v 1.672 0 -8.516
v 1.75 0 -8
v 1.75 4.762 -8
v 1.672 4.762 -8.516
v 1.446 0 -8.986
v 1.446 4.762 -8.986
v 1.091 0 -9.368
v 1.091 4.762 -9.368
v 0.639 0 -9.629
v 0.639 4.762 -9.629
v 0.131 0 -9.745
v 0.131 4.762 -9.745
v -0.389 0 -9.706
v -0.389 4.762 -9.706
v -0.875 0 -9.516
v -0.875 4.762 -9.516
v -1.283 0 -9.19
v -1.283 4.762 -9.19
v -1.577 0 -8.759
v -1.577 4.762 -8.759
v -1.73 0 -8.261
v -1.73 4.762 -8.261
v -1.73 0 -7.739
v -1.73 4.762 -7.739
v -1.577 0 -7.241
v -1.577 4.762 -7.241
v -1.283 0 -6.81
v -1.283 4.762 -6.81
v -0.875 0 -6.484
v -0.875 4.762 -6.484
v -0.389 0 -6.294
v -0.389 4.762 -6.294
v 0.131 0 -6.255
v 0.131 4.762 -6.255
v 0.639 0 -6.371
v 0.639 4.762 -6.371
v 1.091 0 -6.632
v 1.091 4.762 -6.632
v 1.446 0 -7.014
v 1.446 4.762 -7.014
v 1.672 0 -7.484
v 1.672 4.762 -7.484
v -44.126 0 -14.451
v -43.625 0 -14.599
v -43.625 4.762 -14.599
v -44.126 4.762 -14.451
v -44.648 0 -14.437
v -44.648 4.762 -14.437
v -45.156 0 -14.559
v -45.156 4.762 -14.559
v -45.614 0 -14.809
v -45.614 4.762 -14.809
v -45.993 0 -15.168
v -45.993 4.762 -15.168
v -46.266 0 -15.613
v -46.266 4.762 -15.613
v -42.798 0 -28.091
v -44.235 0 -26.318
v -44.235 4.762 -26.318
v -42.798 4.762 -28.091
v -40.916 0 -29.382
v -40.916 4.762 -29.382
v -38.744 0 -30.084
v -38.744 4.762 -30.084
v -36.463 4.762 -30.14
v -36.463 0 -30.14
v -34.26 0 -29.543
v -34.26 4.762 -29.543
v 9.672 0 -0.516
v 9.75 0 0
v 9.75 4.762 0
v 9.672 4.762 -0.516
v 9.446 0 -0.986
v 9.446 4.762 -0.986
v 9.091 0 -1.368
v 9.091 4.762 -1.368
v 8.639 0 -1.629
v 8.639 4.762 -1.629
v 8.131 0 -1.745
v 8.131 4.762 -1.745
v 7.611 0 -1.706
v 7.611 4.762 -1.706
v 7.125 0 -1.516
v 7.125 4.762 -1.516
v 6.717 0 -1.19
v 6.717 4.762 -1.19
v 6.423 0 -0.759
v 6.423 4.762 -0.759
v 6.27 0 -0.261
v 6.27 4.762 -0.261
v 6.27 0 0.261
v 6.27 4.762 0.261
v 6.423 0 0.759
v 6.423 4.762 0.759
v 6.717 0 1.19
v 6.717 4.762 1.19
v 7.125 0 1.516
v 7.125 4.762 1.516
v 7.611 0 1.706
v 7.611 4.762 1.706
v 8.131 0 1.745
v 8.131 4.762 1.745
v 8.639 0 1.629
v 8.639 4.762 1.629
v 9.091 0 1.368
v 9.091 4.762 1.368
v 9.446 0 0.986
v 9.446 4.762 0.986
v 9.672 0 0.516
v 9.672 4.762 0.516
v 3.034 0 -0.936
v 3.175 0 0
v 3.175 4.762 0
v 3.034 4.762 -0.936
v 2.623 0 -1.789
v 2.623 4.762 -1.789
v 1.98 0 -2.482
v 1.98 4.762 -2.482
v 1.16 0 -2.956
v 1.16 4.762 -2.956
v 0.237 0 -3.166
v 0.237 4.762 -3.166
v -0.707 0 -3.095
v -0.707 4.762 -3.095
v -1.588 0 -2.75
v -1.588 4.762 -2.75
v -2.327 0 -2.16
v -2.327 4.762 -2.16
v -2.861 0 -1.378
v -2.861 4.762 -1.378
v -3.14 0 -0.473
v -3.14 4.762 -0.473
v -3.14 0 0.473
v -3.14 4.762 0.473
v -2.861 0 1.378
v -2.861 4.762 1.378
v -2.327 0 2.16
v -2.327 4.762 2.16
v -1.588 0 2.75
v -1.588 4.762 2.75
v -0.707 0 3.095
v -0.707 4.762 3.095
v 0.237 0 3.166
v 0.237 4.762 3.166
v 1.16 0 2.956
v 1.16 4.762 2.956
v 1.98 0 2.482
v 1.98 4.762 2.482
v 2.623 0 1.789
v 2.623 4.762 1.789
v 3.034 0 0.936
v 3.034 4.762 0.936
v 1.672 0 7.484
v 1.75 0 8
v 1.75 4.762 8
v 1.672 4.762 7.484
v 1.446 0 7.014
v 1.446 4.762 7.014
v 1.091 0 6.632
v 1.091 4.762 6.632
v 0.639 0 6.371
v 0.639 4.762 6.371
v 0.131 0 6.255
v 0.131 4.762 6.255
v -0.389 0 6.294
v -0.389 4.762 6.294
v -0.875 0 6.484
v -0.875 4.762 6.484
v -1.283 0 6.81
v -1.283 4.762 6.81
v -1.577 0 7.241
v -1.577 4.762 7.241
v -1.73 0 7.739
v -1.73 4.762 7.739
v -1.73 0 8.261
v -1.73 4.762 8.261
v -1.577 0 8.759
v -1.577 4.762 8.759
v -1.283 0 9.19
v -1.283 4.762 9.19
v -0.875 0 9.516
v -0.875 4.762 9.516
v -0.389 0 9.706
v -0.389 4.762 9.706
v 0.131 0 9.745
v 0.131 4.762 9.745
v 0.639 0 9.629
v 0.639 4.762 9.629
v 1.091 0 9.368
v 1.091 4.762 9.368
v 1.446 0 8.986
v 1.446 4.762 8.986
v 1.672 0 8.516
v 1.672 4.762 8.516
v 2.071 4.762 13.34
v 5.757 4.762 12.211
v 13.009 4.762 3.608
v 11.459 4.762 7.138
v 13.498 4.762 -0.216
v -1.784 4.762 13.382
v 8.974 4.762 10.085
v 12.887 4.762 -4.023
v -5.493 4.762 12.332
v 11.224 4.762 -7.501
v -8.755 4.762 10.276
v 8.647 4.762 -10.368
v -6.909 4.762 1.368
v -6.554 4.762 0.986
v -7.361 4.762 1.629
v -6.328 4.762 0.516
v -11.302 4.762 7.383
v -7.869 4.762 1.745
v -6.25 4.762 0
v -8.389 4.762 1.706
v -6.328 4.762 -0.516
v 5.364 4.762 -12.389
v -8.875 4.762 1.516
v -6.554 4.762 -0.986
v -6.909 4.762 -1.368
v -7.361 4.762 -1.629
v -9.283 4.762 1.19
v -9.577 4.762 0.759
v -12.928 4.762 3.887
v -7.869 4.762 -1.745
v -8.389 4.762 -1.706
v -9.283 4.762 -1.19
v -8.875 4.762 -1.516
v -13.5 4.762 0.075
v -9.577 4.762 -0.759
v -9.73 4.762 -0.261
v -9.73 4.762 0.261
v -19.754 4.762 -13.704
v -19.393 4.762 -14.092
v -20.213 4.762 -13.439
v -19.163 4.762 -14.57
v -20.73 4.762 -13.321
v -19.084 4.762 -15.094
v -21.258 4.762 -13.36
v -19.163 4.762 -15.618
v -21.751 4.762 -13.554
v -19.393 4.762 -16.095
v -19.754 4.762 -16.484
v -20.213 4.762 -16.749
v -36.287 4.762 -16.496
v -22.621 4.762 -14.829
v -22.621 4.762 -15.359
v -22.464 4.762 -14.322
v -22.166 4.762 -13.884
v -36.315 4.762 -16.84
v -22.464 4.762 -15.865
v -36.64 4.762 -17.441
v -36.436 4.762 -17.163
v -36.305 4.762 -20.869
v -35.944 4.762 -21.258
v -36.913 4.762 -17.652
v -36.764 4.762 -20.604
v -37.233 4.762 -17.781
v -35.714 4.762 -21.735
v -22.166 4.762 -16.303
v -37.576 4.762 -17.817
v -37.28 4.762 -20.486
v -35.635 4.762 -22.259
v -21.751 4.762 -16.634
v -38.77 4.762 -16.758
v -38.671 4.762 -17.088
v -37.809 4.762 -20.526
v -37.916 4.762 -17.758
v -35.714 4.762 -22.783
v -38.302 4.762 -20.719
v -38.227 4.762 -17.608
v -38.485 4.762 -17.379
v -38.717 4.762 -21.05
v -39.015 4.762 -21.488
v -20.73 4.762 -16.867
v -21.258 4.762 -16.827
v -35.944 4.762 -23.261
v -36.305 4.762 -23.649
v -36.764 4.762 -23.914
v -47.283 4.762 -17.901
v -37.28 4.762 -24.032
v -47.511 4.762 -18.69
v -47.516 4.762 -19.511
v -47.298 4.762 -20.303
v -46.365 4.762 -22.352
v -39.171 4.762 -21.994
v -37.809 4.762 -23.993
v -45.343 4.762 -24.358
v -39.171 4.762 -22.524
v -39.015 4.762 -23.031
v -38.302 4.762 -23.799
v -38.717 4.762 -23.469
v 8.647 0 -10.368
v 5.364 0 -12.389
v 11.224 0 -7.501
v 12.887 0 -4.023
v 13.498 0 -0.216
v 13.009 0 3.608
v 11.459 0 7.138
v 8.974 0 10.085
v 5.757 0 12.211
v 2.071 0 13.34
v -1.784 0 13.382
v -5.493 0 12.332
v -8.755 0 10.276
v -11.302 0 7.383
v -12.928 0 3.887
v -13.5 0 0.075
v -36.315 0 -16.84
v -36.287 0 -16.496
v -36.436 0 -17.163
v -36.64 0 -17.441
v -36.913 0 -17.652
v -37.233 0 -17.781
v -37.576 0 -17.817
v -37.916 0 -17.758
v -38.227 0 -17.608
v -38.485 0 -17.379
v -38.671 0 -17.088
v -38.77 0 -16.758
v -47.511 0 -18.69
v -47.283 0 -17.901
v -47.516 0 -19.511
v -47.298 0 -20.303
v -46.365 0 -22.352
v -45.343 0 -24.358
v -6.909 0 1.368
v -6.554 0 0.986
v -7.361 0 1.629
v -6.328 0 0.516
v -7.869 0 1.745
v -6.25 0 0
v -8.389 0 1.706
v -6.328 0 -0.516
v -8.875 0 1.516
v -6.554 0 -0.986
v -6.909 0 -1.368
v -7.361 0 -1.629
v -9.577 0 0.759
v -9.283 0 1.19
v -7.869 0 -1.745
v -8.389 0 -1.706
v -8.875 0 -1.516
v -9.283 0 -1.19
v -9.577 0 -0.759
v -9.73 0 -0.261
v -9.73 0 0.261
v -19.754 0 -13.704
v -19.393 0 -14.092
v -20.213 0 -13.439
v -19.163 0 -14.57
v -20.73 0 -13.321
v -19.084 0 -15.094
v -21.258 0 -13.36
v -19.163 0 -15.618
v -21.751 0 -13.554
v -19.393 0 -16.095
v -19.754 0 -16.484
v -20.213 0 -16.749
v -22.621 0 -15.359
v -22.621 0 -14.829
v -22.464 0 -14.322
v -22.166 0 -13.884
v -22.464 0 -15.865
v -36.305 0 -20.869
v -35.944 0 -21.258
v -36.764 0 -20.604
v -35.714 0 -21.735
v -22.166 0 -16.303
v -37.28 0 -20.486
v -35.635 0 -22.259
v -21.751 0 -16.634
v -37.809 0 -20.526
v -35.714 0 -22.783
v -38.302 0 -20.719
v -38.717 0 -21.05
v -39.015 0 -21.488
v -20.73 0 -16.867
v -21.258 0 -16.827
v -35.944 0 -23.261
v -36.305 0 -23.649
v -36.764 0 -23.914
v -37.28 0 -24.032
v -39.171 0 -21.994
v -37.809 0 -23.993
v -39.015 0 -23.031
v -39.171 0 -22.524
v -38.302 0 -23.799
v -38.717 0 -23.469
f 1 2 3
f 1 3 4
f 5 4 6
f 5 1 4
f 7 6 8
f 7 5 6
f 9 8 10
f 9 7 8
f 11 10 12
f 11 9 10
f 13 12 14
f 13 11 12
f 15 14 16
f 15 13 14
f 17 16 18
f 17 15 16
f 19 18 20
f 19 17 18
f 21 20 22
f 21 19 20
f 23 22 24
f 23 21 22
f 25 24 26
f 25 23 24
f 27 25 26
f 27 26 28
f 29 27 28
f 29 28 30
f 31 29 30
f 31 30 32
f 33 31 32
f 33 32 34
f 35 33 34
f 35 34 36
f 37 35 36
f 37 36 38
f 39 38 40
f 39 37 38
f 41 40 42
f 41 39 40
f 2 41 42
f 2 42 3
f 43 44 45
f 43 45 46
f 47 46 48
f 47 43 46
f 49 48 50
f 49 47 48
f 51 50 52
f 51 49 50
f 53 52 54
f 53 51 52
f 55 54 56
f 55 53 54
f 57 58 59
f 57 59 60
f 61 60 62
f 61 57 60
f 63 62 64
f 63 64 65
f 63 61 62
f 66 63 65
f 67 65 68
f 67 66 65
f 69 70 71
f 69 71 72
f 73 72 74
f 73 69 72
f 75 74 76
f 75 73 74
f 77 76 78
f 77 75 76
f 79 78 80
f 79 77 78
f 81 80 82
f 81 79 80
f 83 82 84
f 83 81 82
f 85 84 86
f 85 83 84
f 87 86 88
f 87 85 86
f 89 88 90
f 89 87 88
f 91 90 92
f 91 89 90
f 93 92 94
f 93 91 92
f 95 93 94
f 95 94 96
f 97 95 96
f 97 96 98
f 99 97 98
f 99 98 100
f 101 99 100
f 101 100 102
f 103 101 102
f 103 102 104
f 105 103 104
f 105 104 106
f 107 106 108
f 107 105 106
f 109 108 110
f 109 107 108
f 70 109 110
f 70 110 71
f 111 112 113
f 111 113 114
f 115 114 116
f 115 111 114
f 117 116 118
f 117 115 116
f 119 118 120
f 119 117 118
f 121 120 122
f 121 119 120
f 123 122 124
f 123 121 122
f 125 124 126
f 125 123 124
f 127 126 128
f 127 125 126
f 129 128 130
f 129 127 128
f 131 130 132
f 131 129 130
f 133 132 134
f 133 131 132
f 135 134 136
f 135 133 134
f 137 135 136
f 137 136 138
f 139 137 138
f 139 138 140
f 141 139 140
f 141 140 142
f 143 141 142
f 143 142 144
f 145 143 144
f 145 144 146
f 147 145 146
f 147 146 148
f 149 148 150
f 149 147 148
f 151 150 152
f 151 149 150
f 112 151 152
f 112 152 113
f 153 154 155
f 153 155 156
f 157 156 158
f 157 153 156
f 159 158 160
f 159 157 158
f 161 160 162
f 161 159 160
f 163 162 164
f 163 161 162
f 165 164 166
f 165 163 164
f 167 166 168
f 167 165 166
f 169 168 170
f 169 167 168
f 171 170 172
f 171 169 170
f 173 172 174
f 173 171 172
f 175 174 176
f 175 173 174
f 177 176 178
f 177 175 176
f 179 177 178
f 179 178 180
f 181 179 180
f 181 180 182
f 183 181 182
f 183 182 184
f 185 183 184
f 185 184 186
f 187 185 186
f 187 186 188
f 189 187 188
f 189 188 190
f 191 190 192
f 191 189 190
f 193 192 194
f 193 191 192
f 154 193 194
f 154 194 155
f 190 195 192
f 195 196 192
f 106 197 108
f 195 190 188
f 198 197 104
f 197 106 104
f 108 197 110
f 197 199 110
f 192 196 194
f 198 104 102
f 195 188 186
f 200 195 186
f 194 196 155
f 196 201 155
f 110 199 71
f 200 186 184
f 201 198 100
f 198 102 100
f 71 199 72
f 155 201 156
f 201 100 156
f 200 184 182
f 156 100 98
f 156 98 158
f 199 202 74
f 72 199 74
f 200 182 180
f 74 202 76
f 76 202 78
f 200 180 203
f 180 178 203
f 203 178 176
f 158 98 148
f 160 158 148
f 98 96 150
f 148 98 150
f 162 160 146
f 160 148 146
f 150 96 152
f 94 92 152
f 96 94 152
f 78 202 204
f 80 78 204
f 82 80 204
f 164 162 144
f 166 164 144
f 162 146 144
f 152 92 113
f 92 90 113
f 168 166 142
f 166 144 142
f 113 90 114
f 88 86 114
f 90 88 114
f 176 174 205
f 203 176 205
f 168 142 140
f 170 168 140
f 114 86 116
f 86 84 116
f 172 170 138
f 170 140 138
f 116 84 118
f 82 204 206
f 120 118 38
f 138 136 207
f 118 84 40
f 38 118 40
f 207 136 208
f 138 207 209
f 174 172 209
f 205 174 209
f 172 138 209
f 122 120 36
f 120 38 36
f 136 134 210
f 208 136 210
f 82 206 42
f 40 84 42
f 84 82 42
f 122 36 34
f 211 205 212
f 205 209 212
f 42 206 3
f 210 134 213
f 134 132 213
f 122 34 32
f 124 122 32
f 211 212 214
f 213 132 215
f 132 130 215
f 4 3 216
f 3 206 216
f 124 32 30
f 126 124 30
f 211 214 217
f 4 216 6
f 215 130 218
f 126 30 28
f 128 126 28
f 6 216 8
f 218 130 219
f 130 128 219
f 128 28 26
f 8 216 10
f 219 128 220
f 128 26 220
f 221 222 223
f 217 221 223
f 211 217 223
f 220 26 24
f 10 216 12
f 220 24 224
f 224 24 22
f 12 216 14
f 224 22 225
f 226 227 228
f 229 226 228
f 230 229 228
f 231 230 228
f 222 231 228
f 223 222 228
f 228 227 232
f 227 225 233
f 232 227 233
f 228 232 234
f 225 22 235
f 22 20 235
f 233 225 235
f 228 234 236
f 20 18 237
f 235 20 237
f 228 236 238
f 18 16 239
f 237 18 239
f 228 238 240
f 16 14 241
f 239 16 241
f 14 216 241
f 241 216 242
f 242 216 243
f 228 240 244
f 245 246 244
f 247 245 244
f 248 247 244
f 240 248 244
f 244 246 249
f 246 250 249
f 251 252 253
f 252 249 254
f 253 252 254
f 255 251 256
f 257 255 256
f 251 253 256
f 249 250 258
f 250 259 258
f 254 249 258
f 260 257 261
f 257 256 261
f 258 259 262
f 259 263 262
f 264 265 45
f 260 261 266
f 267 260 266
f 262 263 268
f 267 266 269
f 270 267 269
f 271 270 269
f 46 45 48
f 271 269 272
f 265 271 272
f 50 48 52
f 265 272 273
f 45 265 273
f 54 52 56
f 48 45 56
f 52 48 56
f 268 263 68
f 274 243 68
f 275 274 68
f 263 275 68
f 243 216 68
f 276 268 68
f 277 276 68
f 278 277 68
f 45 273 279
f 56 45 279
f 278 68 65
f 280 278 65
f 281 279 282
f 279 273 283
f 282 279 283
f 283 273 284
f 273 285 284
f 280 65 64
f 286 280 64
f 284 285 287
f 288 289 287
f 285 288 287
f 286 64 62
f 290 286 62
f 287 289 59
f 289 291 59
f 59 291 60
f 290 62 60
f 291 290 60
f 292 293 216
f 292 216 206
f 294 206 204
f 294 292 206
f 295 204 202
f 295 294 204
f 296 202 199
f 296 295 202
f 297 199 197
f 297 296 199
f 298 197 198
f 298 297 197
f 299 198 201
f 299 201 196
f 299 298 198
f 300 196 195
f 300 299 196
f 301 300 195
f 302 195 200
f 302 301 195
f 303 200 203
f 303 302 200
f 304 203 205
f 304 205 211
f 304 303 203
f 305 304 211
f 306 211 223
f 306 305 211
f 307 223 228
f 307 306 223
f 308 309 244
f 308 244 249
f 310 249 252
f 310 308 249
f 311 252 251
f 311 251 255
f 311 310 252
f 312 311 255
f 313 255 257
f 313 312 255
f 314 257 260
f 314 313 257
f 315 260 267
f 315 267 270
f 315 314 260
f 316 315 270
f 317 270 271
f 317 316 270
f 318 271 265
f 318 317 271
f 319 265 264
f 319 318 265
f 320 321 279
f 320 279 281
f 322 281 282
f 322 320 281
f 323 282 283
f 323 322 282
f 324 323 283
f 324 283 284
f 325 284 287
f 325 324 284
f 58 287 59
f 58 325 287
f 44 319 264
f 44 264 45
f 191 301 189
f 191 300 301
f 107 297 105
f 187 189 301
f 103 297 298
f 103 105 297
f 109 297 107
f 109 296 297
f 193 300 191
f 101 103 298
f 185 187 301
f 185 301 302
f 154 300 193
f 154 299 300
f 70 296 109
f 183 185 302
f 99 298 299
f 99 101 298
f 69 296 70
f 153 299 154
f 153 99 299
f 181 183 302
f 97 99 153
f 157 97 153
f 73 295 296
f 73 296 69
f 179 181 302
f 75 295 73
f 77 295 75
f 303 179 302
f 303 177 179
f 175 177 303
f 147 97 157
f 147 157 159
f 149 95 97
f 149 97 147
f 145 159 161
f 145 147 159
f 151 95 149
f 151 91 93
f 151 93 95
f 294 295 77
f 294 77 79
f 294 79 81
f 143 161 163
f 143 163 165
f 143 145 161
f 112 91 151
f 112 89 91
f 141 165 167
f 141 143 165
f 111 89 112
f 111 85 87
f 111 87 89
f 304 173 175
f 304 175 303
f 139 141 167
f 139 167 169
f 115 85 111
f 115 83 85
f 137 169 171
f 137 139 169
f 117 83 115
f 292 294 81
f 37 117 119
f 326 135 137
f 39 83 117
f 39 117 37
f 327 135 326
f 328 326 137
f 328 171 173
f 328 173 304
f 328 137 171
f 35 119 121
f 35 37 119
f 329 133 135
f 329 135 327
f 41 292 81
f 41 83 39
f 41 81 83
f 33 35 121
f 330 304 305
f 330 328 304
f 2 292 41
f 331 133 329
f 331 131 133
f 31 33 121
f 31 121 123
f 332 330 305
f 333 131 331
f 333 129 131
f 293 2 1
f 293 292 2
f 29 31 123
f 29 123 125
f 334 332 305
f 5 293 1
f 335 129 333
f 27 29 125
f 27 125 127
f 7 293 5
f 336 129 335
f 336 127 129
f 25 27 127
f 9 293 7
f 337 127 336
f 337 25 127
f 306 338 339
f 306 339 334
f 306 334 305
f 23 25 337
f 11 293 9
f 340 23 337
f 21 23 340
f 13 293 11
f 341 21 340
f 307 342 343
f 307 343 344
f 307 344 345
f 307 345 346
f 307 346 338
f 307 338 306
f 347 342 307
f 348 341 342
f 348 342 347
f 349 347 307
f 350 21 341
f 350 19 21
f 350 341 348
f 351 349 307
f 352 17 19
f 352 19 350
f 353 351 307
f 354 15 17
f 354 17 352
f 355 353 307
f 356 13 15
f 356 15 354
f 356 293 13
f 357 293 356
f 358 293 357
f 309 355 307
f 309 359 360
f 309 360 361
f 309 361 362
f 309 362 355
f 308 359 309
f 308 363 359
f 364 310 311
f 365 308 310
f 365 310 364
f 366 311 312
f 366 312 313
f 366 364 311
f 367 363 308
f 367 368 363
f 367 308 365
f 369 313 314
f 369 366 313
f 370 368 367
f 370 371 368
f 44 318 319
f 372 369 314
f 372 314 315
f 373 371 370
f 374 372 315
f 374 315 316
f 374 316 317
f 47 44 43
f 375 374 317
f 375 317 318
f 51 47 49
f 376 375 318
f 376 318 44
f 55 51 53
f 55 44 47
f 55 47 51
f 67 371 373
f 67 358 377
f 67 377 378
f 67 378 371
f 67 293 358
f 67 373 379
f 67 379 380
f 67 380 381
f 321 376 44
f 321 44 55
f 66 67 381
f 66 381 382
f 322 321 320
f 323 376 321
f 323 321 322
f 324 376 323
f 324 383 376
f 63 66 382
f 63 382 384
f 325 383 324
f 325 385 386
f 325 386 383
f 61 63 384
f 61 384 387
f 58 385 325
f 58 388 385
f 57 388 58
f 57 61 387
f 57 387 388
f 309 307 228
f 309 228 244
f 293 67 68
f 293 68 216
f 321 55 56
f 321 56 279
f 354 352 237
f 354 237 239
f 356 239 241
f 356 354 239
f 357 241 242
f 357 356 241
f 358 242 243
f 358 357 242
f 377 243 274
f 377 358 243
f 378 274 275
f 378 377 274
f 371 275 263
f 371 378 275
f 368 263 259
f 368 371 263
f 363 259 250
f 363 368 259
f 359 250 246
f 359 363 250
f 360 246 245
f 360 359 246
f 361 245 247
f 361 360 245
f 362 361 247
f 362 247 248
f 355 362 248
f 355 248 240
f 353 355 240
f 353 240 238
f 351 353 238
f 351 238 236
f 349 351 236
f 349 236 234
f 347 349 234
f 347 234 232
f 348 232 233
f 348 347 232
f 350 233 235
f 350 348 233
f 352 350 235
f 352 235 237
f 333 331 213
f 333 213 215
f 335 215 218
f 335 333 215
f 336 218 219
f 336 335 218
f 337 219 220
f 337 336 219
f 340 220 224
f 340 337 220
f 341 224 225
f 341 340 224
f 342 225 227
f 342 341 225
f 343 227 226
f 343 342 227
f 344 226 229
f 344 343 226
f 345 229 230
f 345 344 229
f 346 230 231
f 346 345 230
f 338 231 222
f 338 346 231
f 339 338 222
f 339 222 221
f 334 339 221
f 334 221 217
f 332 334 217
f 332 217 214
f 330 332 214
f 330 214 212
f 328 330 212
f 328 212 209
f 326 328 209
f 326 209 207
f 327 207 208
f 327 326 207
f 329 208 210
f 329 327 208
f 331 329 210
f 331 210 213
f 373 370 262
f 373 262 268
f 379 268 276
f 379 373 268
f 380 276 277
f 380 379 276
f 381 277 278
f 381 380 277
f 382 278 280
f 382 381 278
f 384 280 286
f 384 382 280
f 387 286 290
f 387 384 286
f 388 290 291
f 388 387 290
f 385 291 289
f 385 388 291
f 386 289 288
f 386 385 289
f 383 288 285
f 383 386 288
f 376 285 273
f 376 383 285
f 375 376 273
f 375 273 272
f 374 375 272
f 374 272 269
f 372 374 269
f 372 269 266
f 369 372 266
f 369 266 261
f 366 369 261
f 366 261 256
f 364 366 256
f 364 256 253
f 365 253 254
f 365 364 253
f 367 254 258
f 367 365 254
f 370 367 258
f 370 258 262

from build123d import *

# Parameters (mm, degrees)
SKETCH1_R           = 1.75
SKETCH1_R_2         = 3.175
SKETCH1_R_3         = 1.778
BOSS_EXTRUDE1_DEPTH = 4.7625


with BuildPart() as part:
    # Sketch1 → Boss-Extrude1 (new body)
    with BuildSketch(Plane(origin=(0, 0, 0), x_dir=(1, 0, 0), z_dir=(0, 1, 0))):
        with BuildLine():
            Line((-38.770225031, 16.757963615), (-43.625448569, 14.598747375))
            ThreePointArc((-43.625448569, 14.598747375), (-45.155674622, 14.559326862), (-46.265582353, 15.613485569))
            Line((-46.265582353, 15.613485569), (-47.282683039, 17.900542834))
            ThreePointArc((-47.282683039, 17.900542834), (-47.541465806, 19.100109045), (-47.298283286, 20.302934833))
            ThreePointArc((-47.298283286, 20.302934833), (-45.865213893, 23.360627542), (-44.234733225, 26.317772344))
            ThreePointArc((-44.234733225, 26.317772344), (-39.855484626, 29.811728531), (-34.259632886, 29.543416329))
            Line((-34.259632886, 29.543416329), (5.363638877, 12.388760148))
            ThreePointArc((5.363638877, 12.388760148), (7.44200849, -11.263503435), (-13.499793526, -0.074664302))
            Line((-13.499793526, -0.074664302), (-36.286855081, 16.495885282))
            ThreePointArc((-36.286855081, 16.495885282), (-37.403602541, 17.810792136), (-38.770225031, 16.757963615))
        make_face()
        with Locations((8, 0)):
            Circle(SKETCH1_R, mode=Mode.SUBTRACT)
        with Locations((0, -8)):
            Circle(SKETCH1_R, mode=Mode.SUBTRACT)
        with Locations((-8, 0)):
            Circle(SKETCH1_R, mode=Mode.SUBTRACT)
        with Locations((0, 8)):
            Circle(SKETCH1_R, mode=Mode.SUBTRACT)
        Circle(SKETCH1_R_2, mode=Mode.SUBTRACT)
        with Locations((-20.862458922, 15.093717491)):
            Circle(SKETCH1_R_3, mode=Mode.SUBTRACT)
        with Locations((-37.413253893, 22.259284205)):
            Circle(SKETCH1_R_3, mode=Mode.SUBTRACT)
    extrude(amount=BOSS_EXTRUDE1_DEPTH)


solid = part.part
